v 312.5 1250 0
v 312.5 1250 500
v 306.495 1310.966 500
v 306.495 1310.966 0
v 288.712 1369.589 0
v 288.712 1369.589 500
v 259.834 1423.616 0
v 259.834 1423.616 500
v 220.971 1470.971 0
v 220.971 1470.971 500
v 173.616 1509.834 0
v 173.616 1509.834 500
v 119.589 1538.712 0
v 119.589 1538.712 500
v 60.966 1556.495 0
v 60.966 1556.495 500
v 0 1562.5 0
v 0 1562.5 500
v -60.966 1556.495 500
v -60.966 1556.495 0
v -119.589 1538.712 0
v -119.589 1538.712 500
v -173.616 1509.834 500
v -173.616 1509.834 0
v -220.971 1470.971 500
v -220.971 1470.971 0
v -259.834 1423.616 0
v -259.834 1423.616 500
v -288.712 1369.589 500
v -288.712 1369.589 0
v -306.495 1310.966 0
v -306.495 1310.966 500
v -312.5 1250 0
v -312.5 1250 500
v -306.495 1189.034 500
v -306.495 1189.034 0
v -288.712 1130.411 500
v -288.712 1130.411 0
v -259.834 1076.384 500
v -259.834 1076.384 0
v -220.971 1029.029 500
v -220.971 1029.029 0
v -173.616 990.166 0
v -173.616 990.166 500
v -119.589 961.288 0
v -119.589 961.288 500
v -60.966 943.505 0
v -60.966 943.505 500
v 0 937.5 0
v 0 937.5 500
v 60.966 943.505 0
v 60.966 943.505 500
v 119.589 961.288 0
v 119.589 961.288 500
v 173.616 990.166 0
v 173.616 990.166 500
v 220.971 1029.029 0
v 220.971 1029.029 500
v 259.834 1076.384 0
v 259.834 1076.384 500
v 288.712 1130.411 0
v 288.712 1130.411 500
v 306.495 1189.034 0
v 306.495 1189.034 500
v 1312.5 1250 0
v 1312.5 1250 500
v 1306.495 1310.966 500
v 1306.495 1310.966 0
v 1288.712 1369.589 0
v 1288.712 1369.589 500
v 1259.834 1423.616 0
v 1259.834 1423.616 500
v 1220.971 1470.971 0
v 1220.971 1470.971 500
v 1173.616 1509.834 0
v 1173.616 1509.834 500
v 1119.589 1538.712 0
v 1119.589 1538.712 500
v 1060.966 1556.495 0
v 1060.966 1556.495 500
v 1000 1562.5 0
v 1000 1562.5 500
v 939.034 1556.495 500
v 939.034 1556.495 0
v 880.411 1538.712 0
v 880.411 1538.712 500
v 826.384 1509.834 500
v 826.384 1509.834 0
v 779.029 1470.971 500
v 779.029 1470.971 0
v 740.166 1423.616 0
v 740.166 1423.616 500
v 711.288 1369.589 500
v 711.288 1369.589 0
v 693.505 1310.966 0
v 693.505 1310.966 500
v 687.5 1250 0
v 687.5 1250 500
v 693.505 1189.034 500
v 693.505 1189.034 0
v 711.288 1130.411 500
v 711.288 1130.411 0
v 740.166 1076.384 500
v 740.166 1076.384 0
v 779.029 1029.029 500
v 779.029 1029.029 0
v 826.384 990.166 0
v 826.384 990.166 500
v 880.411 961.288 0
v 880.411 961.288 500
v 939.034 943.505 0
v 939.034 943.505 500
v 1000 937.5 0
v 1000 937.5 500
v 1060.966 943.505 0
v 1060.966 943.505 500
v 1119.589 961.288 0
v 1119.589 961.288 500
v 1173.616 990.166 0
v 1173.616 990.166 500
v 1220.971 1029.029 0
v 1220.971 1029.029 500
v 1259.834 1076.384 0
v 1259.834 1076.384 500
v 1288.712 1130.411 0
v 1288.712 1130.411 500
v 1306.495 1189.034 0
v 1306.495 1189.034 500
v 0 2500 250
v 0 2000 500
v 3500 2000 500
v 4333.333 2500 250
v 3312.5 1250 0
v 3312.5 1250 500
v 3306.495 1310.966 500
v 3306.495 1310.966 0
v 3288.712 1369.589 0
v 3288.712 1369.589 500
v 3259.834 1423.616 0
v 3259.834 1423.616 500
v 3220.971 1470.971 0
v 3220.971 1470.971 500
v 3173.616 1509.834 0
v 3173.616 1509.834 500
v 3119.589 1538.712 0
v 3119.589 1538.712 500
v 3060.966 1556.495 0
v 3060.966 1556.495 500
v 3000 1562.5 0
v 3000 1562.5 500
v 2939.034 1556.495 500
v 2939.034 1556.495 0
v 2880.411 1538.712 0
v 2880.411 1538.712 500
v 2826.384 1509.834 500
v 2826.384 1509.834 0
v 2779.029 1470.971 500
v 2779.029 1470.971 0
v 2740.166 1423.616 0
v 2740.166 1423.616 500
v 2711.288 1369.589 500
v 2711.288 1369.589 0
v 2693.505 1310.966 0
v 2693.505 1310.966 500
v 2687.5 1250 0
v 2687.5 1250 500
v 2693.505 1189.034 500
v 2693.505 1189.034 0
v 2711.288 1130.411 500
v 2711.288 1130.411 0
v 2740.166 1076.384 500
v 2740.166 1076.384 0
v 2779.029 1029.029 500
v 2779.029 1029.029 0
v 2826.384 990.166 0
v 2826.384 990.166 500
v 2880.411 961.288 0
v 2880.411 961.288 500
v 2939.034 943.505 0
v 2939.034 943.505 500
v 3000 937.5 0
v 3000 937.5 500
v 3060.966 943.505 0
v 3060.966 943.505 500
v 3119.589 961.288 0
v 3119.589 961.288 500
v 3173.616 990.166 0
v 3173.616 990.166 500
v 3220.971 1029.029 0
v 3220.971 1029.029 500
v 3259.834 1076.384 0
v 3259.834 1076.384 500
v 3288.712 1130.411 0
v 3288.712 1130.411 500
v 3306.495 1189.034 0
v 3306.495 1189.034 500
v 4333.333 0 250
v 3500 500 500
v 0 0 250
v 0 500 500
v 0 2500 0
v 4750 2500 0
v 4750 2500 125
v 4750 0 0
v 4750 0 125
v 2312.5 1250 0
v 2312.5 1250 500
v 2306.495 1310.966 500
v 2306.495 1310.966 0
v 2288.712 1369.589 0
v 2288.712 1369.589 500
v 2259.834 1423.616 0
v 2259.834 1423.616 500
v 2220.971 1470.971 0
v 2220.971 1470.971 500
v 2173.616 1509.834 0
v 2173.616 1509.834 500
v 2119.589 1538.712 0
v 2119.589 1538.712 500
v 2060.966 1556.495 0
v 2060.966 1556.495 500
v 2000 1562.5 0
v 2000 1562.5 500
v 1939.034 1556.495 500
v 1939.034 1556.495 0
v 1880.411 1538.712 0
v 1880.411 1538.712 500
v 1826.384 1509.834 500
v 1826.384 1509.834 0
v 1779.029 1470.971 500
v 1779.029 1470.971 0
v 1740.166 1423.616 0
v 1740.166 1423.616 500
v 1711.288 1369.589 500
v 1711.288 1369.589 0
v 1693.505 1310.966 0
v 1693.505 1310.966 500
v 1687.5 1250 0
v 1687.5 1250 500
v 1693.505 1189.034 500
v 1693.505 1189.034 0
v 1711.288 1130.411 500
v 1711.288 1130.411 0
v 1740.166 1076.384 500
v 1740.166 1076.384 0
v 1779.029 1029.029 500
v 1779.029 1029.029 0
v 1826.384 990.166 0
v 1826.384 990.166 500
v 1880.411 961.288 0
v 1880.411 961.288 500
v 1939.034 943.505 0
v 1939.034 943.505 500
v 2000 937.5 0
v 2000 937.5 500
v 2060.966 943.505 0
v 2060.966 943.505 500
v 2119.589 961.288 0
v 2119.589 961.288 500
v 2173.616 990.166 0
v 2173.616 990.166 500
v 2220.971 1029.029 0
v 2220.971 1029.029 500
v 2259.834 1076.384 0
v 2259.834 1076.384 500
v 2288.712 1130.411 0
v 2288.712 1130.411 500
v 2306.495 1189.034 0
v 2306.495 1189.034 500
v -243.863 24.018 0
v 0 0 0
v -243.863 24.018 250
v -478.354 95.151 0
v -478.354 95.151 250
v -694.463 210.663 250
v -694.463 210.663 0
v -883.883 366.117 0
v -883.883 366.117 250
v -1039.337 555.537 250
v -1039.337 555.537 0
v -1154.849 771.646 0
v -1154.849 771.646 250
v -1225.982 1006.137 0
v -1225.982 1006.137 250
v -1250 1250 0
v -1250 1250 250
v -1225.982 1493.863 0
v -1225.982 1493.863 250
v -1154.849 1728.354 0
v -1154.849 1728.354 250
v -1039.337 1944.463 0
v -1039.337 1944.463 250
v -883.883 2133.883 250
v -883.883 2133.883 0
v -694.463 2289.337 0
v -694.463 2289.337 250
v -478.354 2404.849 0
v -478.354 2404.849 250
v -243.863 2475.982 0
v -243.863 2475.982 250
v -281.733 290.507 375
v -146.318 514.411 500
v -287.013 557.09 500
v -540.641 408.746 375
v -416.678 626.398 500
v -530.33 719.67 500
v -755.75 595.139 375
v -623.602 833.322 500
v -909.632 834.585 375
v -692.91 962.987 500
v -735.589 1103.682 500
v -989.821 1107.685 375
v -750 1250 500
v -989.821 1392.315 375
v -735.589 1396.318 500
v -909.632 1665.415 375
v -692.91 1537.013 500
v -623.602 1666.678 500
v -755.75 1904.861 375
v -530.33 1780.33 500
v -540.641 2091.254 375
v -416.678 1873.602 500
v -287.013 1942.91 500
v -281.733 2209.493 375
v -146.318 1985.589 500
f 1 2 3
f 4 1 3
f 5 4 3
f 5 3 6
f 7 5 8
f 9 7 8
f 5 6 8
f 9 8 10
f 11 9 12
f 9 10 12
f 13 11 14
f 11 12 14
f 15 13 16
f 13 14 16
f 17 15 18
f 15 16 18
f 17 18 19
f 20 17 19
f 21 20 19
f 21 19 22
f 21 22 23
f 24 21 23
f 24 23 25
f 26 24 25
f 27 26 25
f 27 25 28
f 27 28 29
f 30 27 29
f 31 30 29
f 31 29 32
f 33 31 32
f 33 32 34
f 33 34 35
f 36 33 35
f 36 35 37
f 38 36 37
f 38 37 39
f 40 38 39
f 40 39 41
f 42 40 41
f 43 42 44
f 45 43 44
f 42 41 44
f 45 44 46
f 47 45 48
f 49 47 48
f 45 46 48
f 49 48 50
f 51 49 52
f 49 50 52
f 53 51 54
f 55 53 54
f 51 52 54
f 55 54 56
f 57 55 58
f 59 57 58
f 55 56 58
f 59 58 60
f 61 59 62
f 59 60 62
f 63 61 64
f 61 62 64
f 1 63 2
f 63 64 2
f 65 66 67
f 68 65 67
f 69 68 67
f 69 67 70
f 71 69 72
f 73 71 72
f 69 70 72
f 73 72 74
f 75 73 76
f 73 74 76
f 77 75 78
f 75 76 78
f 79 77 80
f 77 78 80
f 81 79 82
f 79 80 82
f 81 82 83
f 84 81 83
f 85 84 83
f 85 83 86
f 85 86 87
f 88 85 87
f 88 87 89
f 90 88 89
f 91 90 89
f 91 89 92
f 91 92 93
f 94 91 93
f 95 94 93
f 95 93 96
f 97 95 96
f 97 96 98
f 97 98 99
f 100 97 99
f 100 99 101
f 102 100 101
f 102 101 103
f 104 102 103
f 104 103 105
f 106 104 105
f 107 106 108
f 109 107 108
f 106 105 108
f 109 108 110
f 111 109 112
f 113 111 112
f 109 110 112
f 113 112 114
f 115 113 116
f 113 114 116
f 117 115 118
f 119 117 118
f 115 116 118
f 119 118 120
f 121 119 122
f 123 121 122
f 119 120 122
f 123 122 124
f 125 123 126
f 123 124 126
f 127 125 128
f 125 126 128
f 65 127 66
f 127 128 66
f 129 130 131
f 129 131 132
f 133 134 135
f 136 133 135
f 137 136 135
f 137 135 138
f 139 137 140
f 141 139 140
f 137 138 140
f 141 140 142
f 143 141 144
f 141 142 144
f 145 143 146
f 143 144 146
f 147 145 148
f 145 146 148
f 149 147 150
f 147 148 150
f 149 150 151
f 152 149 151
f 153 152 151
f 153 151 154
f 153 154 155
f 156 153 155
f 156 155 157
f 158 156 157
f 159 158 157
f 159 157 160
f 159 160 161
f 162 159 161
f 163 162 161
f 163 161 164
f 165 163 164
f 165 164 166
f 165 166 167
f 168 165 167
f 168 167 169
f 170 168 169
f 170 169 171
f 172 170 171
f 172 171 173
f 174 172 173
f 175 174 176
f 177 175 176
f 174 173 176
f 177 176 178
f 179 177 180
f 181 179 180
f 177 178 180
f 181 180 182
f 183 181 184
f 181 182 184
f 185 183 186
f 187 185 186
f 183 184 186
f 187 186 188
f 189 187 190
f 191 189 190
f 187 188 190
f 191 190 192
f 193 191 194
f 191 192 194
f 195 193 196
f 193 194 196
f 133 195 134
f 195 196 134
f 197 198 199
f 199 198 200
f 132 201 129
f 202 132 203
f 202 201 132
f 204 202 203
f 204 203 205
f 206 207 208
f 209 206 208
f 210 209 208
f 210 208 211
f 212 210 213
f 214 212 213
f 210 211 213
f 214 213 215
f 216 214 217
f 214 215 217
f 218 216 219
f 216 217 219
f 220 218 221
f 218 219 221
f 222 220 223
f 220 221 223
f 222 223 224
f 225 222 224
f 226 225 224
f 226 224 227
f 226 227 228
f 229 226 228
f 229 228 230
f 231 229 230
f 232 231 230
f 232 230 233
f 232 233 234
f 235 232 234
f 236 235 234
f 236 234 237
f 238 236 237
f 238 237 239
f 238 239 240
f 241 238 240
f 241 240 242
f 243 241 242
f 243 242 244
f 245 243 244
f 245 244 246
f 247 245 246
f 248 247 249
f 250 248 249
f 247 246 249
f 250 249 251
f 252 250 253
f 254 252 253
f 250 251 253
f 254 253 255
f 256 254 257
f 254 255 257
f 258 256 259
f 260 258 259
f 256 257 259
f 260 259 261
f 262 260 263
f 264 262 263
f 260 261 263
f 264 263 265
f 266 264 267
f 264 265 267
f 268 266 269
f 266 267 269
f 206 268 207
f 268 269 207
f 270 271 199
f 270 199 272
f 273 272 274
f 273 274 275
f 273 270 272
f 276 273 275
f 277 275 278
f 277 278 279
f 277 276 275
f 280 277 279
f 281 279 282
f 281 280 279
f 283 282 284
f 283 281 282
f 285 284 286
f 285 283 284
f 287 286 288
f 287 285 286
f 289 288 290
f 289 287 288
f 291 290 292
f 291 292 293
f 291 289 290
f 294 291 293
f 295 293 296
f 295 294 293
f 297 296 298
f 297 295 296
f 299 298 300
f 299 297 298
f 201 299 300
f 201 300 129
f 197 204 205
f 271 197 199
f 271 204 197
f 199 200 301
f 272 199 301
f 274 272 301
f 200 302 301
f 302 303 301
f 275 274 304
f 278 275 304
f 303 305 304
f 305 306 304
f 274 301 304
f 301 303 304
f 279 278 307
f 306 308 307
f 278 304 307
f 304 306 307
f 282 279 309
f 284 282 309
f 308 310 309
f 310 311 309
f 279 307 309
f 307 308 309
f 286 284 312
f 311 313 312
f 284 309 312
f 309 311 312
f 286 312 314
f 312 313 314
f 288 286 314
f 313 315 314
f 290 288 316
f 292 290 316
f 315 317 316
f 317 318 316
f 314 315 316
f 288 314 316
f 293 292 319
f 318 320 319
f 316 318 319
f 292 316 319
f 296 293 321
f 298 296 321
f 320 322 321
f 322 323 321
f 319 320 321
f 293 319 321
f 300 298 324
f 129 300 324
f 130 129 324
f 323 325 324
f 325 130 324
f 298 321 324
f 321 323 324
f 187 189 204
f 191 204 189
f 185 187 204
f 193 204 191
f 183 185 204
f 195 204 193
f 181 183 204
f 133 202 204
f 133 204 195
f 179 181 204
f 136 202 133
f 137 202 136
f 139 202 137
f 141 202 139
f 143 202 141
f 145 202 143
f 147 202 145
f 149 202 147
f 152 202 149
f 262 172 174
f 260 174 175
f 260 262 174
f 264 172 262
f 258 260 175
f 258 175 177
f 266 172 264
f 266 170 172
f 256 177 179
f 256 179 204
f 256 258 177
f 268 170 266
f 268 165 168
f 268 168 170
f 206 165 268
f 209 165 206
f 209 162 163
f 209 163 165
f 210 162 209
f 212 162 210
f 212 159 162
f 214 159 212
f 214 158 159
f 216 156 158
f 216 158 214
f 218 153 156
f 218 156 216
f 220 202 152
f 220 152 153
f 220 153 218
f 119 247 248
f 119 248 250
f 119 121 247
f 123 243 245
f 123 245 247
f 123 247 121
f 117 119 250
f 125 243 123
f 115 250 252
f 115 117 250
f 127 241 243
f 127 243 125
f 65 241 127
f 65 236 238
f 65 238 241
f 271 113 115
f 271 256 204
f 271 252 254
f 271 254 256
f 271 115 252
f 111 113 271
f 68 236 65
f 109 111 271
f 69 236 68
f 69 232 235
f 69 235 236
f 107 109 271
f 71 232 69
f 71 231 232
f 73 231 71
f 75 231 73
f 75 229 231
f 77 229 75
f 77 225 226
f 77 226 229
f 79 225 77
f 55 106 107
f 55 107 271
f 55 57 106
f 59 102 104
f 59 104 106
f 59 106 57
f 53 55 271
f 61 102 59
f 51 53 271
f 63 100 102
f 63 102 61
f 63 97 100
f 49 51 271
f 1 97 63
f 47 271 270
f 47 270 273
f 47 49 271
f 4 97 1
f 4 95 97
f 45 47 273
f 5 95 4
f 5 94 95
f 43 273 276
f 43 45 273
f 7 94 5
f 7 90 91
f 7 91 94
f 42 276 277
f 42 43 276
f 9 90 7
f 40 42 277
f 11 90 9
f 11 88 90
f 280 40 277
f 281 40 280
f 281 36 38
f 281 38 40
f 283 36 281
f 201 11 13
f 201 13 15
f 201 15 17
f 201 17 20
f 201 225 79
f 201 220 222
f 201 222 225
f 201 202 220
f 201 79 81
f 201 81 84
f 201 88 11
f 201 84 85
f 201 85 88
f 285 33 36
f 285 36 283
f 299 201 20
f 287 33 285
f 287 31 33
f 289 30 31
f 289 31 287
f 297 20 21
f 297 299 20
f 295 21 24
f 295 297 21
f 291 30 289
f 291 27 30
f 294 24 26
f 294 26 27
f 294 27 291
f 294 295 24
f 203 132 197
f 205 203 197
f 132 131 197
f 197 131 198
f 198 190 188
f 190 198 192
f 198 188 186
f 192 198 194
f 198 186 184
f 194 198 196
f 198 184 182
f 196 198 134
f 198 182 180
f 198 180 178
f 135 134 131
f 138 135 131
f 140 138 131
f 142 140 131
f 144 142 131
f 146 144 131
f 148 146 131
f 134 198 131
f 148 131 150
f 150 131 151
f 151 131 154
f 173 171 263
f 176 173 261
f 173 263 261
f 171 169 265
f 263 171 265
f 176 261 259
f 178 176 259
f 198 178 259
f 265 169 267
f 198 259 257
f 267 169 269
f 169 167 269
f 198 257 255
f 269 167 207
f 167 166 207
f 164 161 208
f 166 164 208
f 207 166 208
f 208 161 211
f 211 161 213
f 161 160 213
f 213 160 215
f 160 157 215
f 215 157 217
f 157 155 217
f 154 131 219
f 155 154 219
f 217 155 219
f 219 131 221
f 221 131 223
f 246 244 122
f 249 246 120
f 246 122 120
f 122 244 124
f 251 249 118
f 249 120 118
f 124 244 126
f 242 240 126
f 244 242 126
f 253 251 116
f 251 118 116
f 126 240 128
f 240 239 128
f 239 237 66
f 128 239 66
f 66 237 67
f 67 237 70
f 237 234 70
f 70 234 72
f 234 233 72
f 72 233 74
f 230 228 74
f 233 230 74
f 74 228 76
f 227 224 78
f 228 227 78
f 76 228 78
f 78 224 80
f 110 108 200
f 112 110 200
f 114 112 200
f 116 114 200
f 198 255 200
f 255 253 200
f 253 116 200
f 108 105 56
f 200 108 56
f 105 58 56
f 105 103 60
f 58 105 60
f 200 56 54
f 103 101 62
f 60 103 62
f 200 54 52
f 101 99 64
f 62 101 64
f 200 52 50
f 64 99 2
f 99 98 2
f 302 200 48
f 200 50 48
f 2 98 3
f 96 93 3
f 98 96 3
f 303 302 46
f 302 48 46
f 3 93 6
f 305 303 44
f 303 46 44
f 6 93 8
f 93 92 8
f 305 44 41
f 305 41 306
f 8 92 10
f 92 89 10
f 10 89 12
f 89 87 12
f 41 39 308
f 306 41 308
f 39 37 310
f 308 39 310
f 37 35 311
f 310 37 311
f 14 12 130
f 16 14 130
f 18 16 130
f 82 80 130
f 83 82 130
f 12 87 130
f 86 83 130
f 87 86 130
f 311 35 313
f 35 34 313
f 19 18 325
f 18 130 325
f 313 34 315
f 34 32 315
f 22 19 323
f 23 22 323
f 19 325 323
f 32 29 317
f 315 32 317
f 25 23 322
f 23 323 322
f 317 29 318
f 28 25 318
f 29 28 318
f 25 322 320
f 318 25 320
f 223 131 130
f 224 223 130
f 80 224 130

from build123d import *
from OCP.BRepFilletAPI import BRepFilletAPI_MakeChamfer

# Parameters (mm, degrees)
BOSS_EXTRUDE1_DEPTH = 500
CHAMFER1_SIZE       = 250
CHAMFER1_SIZE2      = 500
CHAMFER2_SIZE       = 375
CHAMFER2_SIZE2      = 1250
SKETCH3_R           = 312.5
CUT_EXTRUDE1_DEPTH  = 5391.964663212


with BuildPart() as part:
    # Sketch2 → Boss-Extrude1 (new body)
    with BuildSketch(Plane.XY):
        with BuildLine():
            Line((0, 2500), (4750, 2500))
            Line((4750, 2500), (4750, 0))
            Line((4750, 0), (0, 0))
            ThreePointArc((0, 0), (-1250, 1250), (0, 2500))
        make_face()
    extrude(amount=BOSS_EXTRUDE1_DEPTH)

    # Chamfer1: one chamfer whose edges measure the first distance from different faces: ONE call of the kernel's chamfer builder (chamfer() names one face for all edges)
    chamfer1_edges_1 = [part.edges().sort_by_distance(p)[0] for p in [
        (2375, 2500, 500),
    ]]
    chamfer1_side_1 = [part.faces().sort_by_distance(p)[0] for p in [
        (2375, 2500, 250),
    ]]
    chamfer1_edges_2 = [part.edges().sort_by_distance(p)[0] for p in [
        (-1250, 1250, 500),
    ]]
    chamfer1_side_2 = [part.faces().sort_by_distance(p)[0] for p in [
        (-1250, 1250, 250),
    ]]
    chamfer1_edges_3 = [part.edges().sort_by_distance(p)[0] for p in [
        (2375, 0, 500),
    ]]
    chamfer1_side_3 = [part.faces().sort_by_distance(p)[0] for p in [
        (2375, 0, 250),
    ]]
    chamfer1 = BRepFilletAPI_MakeChamfer(part.part.solid().wrapped)
    for e in chamfer1_edges_1:
        chamfer1.Add(CHAMFER1_SIZE, CHAMFER1_SIZE2, e.wrapped, chamfer1_side_1[0].wrapped)  # the first distance lies on this face
    for e in chamfer1_edges_2:
        chamfer1.Add(CHAMFER1_SIZE, CHAMFER1_SIZE2, e.wrapped, chamfer1_side_2[0].wrapped)  # the first distance lies on this face
    for e in chamfer1_edges_3:
        chamfer1.Add(CHAMFER1_SIZE, CHAMFER1_SIZE2, e.wrapped, chamfer1_side_3[0].wrapped)  # the first distance lies on this face
    add(Compound.cast(chamfer1.Shape()), mode=Mode.REPLACE)

    # Chamfer2
    chamfer2_edges = [part.edges().sort_by_distance(p)[0] for p in [
        (4750, 1250, 500),
    ]]
    chamfer2_side = [part.faces().sort_by_distance(p)[0] for p in [
        (4750, 1250, 231.481481481),
    ]]
    chamfer(chamfer2_edges, length=CHAMFER2_SIZE, length2=CHAMFER2_SIZE2, reference=chamfer2_side[0])

    # Sketch3 → Cut-Extrude1 (cut, through all)
    with BuildSketch(Plane.XY.offset(500)):
        with Locations((0, 1250)):
            Circle(SKETCH3_R)
        with Locations((1000, 1250)):
            Circle(SKETCH3_R)
        with Locations((2000, 1250)):
            Circle(SKETCH3_R)
        with Locations((3000, 1250)):
            Circle(SKETCH3_R)
    extrude(amount=-CUT_EXTRUDE1_DEPTH, mode=Mode.SUBTRACT)


solid = part.part
